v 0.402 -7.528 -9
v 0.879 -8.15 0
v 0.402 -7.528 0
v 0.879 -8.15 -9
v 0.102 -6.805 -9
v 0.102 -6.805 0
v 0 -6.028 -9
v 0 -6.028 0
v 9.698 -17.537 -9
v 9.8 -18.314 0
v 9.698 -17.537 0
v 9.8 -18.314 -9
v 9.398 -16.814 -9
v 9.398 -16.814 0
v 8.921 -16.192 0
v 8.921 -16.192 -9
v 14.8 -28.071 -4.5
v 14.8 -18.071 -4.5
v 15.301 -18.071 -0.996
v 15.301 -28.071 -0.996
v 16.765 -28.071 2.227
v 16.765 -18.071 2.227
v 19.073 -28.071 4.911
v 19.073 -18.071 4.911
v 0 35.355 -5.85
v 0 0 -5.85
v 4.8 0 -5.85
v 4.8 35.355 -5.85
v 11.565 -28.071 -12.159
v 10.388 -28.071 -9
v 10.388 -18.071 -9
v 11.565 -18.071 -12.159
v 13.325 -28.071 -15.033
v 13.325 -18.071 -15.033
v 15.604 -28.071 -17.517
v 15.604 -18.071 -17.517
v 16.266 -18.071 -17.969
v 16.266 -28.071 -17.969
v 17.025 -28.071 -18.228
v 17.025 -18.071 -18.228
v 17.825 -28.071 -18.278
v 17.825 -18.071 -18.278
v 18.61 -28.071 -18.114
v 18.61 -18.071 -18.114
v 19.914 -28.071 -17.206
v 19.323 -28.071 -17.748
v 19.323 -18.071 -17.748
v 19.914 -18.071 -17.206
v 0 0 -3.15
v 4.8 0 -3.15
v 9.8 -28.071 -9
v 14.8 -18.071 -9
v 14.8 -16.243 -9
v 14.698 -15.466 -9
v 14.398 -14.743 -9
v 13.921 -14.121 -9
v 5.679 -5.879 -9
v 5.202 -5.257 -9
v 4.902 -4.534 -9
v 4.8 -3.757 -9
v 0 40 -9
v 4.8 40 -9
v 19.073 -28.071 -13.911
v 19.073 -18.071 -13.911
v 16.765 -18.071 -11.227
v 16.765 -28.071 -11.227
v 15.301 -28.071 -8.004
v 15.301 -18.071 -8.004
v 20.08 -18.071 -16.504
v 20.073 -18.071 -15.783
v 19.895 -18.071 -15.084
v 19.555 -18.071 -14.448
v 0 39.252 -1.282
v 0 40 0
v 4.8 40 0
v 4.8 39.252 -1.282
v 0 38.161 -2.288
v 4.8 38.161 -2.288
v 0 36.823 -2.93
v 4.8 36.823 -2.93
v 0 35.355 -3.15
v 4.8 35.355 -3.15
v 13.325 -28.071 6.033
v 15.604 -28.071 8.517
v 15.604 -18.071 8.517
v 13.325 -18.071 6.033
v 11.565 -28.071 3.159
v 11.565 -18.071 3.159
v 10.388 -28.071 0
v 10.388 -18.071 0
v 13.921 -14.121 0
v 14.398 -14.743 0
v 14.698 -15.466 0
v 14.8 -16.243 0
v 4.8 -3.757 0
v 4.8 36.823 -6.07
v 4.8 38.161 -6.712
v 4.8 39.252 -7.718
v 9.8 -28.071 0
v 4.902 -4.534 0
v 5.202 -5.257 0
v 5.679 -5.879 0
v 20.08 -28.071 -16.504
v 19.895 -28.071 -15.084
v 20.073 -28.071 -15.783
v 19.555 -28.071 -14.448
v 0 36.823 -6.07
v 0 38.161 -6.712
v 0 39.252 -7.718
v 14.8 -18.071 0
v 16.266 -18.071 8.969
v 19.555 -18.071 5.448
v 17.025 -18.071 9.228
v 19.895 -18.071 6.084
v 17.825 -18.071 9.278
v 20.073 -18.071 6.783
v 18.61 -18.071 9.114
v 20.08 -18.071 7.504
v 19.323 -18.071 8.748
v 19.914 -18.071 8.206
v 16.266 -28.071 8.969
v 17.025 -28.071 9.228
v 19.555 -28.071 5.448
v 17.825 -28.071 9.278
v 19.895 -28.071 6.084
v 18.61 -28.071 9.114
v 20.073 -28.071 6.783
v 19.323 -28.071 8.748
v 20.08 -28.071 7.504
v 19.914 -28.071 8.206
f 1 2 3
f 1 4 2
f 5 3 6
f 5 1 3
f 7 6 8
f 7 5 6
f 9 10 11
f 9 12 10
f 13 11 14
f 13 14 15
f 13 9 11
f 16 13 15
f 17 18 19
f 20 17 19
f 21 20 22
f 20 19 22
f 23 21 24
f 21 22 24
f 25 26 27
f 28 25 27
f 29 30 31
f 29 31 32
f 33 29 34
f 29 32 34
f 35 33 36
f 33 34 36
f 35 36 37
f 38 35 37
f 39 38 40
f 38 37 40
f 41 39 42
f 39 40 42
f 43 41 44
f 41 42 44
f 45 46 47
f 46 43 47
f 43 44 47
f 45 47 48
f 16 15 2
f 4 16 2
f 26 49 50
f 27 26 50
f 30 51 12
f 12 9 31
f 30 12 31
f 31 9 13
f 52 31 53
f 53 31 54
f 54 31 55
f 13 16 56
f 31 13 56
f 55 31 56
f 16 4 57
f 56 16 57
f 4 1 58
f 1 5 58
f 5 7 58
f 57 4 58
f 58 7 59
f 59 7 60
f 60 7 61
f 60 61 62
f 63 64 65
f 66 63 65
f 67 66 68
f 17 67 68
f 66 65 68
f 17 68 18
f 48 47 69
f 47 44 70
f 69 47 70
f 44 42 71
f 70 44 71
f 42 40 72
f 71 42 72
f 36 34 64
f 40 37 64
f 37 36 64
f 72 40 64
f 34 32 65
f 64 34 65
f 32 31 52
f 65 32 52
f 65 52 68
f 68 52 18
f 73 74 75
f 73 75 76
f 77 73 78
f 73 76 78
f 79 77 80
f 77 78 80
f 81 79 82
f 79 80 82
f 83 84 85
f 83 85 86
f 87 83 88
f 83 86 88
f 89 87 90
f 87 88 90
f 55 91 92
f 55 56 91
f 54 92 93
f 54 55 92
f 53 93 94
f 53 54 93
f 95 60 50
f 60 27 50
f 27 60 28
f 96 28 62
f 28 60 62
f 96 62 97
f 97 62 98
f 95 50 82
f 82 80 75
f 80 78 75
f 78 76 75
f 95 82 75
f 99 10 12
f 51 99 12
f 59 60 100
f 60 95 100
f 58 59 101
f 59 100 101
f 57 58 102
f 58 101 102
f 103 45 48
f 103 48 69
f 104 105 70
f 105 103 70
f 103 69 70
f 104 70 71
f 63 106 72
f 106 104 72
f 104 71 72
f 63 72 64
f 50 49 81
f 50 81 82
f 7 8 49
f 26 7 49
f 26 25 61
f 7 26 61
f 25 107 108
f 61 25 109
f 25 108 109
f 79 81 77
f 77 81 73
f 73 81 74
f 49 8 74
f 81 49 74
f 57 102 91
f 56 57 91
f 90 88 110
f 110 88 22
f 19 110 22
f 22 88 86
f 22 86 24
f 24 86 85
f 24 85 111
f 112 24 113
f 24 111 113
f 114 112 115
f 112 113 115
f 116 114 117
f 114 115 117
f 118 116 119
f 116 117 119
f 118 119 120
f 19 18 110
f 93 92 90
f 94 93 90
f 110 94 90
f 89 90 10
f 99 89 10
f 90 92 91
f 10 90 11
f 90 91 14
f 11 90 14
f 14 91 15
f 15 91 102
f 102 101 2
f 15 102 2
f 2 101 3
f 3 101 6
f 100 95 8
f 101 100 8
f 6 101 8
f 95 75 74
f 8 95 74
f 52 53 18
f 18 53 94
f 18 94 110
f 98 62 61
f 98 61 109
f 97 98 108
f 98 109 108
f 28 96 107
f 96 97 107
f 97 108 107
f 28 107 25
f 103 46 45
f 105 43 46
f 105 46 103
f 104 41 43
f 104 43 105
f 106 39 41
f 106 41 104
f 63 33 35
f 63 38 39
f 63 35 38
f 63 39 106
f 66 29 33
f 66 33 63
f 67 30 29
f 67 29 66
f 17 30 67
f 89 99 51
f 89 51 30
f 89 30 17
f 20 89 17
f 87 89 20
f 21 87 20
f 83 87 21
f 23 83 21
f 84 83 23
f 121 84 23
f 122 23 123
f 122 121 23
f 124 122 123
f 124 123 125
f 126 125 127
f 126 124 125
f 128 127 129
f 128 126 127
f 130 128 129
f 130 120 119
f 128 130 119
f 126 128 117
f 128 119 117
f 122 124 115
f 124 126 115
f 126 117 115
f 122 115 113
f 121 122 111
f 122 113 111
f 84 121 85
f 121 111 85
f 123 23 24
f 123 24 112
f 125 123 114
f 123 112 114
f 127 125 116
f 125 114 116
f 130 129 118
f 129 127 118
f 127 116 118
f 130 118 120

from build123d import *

# Parameters (mm, degrees)
SKETCH1_W             = 4.8
SKETCH1_H             = 3.15
BOSS_EXTRUDE1_DEPTH   = 40
BOSS_EXTRUDE1_2_DEPTH = 40
SKETCH2_W             = 4.8
SKETCH2_H             = 9
BOSS_EXTRUDE2_DEPTH   = 5
BOSS_EXTRUDE3_DEPTH   = 9
BOSS_EXTRUDE4_DEPTH   = 10
FILLET1_R             = 5
FILLET2_R             = 3
FILLET3_R             = 3


with BuildPart() as part:
    # Sketch1 → Boss-Extrude1 (new body)
    with BuildSketch(Plane(origin=(0, 0, 0), x_dir=(1, 0, 0), z_dir=(0, 1, 0))):
        with Locations((2.4, 7.425)):
            Rectangle(SKETCH1_W, SKETCH1_H)
    extrude(amount=BOSS_EXTRUDE1_DEPTH)



with BuildPart() as body_2:
    # Sketch1 → Boss-Extrude1 2 (new body)
    with BuildSketch(Plane(origin=(0, 0, 0), x_dir=(1, 0, 0), z_dir=(0, 1, 0))):
        with Locations((2.4, 1.575)):
            Rectangle(SKETCH1_W, SKETCH1_H)
    extrude(amount=BOSS_EXTRUDE1_2_DEPTH)


with BuildPart() as part_1:
    add(part.part)

    add(body_2.part)  # Boss-Extrude2 merges body 2
    # Sketch2 → Boss-Extrude2 (add)
    with BuildSketch(Plane.XZ):
        with Locations((2.4, -4.5)):
            Rectangle(SKETCH2_W, SKETCH2_H)
    extrude(amount=BOSS_EXTRUDE2_DEPTH)

    # Sketch3 → Boss-Extrude3 (add)
    with BuildSketch(Plane(origin=(4, 0, 0), x_dir=(-1, 0, 0), z_dir=(0, 0, -1))):
        Polygon((-5.8, -17.071067812), (4, -7.271067812), (4, -5), (-0.8, -5), (-10.8, -15), (-10.8, -18.071067812), (-5.8, -18.071067812), align=None)
    extrude(amount=BOSS_EXTRUDE3_DEPTH)

    # Sketch4 → Boss-Extrude4 (add)
    with BuildSketch(Plane.XZ.offset(18.071067812)):
        with BuildLine():
            Line((9.8, 0), (9.8, -4.5))
            ThreePointArc((9.8, -4.5), (9.94774, -2.230843129), (10.388465475, 0))
            Line((10.388465475, 0), (9.8, 0))
        make_face()
        with BuildLine():
            ThreePointArc((10.388465475, -9), (9.94774, -6.769156871), (9.8, -4.5))
            Line((9.8, -4.5), (9.8, -9))
            Line((9.8, -9), (10.388465475, -9))
        make_face()
        with BuildLine():
            ThreePointArc((21.05, -15.325317547), (16.474682453, -10.75), (14.8, -4.5))
            Line((14.8, -4.5), (14.8, -9))
            Line((14.8, -9), (10.388465475, -9))
            ThreePointArc((10.388465475, -9), (13.407080463, -15.141277495), (18.55, -19.655444566))
            Line((18.55, -19.655444566), (21.05, -15.325317547))
        make_face()
        with BuildLine():
            Line((14.8, -9), (14.8, -4.5))
            Line((14.8, -4.5), (9.8, -4.5))
            ThreePointArc((9.8, -4.5), (9.94774, -6.769156871), (10.388465475, -9))
            Line((10.388465475, -9), (14.8, -9))
        make_face()
        with BuildLine():
            Line((9.8, -4.5), (14.8, -4.5))
            Line((14.8, -4.5), (14.8, 0))
            Line((14.8, 0), (10.388465475, 0))
            ThreePointArc((10.388465475, 0), (9.94774, -2.230843129), (9.8, -4.5))
        make_face()
        with BuildLine():
            Line((14.8, 0), (14.8, -4.5))
            ThreePointArc((14.8, -4.5), (16.474682453, 1.75), (21.05, 6.325317547))
            Line((21.05, 6.325317547), (18.55, 10.655444566))
            ThreePointArc((18.55, 10.655444566), (13.407080463, 6.141277495), (10.388465475, 0))
            Line((10.388465475, 0), (14.8, 0))
        make_face()
    extrude(amount=BOSS_EXTRUDE4_DEPTH)

    # Fillet1
    # the kernel refuses this fillet: 5 mm, written as the material it takes off along each edge
    with BuildSketch(Plane(origin=(16.412896925, 40, -3.15), x_dir=(0, 0, 1), z_dir=(-1, 0, 0))) as fillet1_piece_1:
        with BuildLine():
            CenterArc((5, -4.64515877), FILLET1_R, 111.715617283, 68.284382717)
            Line((0, -4.64515877), (-0.1, -4.64515877))
            Line((-0.1, -4.64515877), (-0.1, 0))
            Line((-0.1, 0), (0, 0.1))
            ThreePointArc((0, 0.1), (1.575, 0.1), (3.113, 0.092903175))
            Line((3.113, 0.092903175), (3.15, 0))
        make_face()
    extrude(amount=28.025793851, mode=Mode.SUBTRACT)
    with BuildSketch(Plane(origin=(-11.612896925, 40, -5.85), x_dir=(0, -1, 0), z_dir=(1, 0, 0))) as fillet1_piece_2:
        with BuildLine():
            CenterArc((4.64515877, 5), FILLET1_R, 201.715617283, 68.284382717)
            Line((0, 3.15), (-0.092903175, 3.113))
            ThreePointArc((-0.092903175, 3.113), (-0.1, 1.575), (-0.1, 0))
            Line((-0.1, 0), (0, -0.1))
            Line((0, -0.1), (4.64515877, -0.1))
            Line((4.64515877, -0.1), (4.64515877, 0))
        make_face()
    extrude(amount=28.025793851, mode=Mode.SUBTRACT)

    # Fillet2
    # the kernel refuses this fillet: 3 mm, written as the material it takes off along each edge
    with BuildSketch(Plane(origin=(21.05, -11.303801998, 6.325317547), x_dir=(-0.8133042312871992, 0, -0.581838660945058), z_dir=(0, -1, 0))) as fillet2_piece_1:
        with BuildLine():
            CenterArc((2.722578478, -2.985784367), FILLET2_R, 95.579968436, 78.840063128)
            Line((-0.263205889, -2.69407953), (0, 0))
            ThreePointArc((0, 0), (1.21543682, -0.059231803), (2.430873641, 0))
        make_face()
    extrude(amount=23.534531629, mode=Mode.SUBTRACT)
    with BuildSketch(Plane(origin=(21.05, -11.303801998, -15.325317547), x_dir=(-0.4999999999999966, 0, -0.8660254037844407), z_dir=(0, -1, 0))) as fillet2_piece_2:
        with BuildLine():
            CenterArc((2.706906326, -3), FILLET2_R, 90, 78.840063128)
            ThreePointArc((-0.236365866, -2.419354839), (-0.059231803, -1.21543682), (0, 0))
            Line((0, 0), (2.706906326, 0))
        make_face()
    extrude(amount=23.534531629, mode=Mode.SUBTRACT)
    with BuildSketch(Plane(origin=(18.55, -8.969979336, -19.655444566), x_dir=(-0.8093218589148085, 0, 0.5873654132502858), z_dir=(0, -1, 0))) as fillet2_piece_3:
        with BuildLine():
            CenterArc((3.328398071, -2.983727989), FILLET2_R, 84.02972802, 101.940543961)
            Line((0.344670082, -3.295765308), (0, 0))
            ThreePointArc((0, 0), (1.820217695, 0.094920065), (3.64043539, 0))
        make_face()
    extrude(amount=28.202176951, mode=Mode.SUBTRACT)
    with BuildSketch(Plane(origin=(18.55, -8.969979336, 10.655444566), x_dir=(-0.8093218589148087, 0, -0.5873654132502856), z_dir=(0, -1, 0))) as fillet2_piece_4:
        with BuildLine():
            CenterArc((3.328398071, 2.983727989), FILLET2_R, 174.02972802, 101.940543961)
            Line((0.344670082, 3.295765308), (0, 0))
            ThreePointArc((0, 0), (1.820217695, -0.094920065), (3.64043539, 0))
        make_face()
    extrude(amount=28.202176951, mode=Mode.SUBTRACT)

    # Fillet3
    fillet3_edges = [part_1.edges().sort_by_distance(p)[0] for p in [
        (4.8, -5, -4.5),
        (9.8, -17.071067812, -4.5),
        (0, -7.271067812, -4.5),
        (14.8, -15, -4.5),
    ]]
    fillet(fillet3_edges, radius=FILLET3_R)


solid = part_1.part
